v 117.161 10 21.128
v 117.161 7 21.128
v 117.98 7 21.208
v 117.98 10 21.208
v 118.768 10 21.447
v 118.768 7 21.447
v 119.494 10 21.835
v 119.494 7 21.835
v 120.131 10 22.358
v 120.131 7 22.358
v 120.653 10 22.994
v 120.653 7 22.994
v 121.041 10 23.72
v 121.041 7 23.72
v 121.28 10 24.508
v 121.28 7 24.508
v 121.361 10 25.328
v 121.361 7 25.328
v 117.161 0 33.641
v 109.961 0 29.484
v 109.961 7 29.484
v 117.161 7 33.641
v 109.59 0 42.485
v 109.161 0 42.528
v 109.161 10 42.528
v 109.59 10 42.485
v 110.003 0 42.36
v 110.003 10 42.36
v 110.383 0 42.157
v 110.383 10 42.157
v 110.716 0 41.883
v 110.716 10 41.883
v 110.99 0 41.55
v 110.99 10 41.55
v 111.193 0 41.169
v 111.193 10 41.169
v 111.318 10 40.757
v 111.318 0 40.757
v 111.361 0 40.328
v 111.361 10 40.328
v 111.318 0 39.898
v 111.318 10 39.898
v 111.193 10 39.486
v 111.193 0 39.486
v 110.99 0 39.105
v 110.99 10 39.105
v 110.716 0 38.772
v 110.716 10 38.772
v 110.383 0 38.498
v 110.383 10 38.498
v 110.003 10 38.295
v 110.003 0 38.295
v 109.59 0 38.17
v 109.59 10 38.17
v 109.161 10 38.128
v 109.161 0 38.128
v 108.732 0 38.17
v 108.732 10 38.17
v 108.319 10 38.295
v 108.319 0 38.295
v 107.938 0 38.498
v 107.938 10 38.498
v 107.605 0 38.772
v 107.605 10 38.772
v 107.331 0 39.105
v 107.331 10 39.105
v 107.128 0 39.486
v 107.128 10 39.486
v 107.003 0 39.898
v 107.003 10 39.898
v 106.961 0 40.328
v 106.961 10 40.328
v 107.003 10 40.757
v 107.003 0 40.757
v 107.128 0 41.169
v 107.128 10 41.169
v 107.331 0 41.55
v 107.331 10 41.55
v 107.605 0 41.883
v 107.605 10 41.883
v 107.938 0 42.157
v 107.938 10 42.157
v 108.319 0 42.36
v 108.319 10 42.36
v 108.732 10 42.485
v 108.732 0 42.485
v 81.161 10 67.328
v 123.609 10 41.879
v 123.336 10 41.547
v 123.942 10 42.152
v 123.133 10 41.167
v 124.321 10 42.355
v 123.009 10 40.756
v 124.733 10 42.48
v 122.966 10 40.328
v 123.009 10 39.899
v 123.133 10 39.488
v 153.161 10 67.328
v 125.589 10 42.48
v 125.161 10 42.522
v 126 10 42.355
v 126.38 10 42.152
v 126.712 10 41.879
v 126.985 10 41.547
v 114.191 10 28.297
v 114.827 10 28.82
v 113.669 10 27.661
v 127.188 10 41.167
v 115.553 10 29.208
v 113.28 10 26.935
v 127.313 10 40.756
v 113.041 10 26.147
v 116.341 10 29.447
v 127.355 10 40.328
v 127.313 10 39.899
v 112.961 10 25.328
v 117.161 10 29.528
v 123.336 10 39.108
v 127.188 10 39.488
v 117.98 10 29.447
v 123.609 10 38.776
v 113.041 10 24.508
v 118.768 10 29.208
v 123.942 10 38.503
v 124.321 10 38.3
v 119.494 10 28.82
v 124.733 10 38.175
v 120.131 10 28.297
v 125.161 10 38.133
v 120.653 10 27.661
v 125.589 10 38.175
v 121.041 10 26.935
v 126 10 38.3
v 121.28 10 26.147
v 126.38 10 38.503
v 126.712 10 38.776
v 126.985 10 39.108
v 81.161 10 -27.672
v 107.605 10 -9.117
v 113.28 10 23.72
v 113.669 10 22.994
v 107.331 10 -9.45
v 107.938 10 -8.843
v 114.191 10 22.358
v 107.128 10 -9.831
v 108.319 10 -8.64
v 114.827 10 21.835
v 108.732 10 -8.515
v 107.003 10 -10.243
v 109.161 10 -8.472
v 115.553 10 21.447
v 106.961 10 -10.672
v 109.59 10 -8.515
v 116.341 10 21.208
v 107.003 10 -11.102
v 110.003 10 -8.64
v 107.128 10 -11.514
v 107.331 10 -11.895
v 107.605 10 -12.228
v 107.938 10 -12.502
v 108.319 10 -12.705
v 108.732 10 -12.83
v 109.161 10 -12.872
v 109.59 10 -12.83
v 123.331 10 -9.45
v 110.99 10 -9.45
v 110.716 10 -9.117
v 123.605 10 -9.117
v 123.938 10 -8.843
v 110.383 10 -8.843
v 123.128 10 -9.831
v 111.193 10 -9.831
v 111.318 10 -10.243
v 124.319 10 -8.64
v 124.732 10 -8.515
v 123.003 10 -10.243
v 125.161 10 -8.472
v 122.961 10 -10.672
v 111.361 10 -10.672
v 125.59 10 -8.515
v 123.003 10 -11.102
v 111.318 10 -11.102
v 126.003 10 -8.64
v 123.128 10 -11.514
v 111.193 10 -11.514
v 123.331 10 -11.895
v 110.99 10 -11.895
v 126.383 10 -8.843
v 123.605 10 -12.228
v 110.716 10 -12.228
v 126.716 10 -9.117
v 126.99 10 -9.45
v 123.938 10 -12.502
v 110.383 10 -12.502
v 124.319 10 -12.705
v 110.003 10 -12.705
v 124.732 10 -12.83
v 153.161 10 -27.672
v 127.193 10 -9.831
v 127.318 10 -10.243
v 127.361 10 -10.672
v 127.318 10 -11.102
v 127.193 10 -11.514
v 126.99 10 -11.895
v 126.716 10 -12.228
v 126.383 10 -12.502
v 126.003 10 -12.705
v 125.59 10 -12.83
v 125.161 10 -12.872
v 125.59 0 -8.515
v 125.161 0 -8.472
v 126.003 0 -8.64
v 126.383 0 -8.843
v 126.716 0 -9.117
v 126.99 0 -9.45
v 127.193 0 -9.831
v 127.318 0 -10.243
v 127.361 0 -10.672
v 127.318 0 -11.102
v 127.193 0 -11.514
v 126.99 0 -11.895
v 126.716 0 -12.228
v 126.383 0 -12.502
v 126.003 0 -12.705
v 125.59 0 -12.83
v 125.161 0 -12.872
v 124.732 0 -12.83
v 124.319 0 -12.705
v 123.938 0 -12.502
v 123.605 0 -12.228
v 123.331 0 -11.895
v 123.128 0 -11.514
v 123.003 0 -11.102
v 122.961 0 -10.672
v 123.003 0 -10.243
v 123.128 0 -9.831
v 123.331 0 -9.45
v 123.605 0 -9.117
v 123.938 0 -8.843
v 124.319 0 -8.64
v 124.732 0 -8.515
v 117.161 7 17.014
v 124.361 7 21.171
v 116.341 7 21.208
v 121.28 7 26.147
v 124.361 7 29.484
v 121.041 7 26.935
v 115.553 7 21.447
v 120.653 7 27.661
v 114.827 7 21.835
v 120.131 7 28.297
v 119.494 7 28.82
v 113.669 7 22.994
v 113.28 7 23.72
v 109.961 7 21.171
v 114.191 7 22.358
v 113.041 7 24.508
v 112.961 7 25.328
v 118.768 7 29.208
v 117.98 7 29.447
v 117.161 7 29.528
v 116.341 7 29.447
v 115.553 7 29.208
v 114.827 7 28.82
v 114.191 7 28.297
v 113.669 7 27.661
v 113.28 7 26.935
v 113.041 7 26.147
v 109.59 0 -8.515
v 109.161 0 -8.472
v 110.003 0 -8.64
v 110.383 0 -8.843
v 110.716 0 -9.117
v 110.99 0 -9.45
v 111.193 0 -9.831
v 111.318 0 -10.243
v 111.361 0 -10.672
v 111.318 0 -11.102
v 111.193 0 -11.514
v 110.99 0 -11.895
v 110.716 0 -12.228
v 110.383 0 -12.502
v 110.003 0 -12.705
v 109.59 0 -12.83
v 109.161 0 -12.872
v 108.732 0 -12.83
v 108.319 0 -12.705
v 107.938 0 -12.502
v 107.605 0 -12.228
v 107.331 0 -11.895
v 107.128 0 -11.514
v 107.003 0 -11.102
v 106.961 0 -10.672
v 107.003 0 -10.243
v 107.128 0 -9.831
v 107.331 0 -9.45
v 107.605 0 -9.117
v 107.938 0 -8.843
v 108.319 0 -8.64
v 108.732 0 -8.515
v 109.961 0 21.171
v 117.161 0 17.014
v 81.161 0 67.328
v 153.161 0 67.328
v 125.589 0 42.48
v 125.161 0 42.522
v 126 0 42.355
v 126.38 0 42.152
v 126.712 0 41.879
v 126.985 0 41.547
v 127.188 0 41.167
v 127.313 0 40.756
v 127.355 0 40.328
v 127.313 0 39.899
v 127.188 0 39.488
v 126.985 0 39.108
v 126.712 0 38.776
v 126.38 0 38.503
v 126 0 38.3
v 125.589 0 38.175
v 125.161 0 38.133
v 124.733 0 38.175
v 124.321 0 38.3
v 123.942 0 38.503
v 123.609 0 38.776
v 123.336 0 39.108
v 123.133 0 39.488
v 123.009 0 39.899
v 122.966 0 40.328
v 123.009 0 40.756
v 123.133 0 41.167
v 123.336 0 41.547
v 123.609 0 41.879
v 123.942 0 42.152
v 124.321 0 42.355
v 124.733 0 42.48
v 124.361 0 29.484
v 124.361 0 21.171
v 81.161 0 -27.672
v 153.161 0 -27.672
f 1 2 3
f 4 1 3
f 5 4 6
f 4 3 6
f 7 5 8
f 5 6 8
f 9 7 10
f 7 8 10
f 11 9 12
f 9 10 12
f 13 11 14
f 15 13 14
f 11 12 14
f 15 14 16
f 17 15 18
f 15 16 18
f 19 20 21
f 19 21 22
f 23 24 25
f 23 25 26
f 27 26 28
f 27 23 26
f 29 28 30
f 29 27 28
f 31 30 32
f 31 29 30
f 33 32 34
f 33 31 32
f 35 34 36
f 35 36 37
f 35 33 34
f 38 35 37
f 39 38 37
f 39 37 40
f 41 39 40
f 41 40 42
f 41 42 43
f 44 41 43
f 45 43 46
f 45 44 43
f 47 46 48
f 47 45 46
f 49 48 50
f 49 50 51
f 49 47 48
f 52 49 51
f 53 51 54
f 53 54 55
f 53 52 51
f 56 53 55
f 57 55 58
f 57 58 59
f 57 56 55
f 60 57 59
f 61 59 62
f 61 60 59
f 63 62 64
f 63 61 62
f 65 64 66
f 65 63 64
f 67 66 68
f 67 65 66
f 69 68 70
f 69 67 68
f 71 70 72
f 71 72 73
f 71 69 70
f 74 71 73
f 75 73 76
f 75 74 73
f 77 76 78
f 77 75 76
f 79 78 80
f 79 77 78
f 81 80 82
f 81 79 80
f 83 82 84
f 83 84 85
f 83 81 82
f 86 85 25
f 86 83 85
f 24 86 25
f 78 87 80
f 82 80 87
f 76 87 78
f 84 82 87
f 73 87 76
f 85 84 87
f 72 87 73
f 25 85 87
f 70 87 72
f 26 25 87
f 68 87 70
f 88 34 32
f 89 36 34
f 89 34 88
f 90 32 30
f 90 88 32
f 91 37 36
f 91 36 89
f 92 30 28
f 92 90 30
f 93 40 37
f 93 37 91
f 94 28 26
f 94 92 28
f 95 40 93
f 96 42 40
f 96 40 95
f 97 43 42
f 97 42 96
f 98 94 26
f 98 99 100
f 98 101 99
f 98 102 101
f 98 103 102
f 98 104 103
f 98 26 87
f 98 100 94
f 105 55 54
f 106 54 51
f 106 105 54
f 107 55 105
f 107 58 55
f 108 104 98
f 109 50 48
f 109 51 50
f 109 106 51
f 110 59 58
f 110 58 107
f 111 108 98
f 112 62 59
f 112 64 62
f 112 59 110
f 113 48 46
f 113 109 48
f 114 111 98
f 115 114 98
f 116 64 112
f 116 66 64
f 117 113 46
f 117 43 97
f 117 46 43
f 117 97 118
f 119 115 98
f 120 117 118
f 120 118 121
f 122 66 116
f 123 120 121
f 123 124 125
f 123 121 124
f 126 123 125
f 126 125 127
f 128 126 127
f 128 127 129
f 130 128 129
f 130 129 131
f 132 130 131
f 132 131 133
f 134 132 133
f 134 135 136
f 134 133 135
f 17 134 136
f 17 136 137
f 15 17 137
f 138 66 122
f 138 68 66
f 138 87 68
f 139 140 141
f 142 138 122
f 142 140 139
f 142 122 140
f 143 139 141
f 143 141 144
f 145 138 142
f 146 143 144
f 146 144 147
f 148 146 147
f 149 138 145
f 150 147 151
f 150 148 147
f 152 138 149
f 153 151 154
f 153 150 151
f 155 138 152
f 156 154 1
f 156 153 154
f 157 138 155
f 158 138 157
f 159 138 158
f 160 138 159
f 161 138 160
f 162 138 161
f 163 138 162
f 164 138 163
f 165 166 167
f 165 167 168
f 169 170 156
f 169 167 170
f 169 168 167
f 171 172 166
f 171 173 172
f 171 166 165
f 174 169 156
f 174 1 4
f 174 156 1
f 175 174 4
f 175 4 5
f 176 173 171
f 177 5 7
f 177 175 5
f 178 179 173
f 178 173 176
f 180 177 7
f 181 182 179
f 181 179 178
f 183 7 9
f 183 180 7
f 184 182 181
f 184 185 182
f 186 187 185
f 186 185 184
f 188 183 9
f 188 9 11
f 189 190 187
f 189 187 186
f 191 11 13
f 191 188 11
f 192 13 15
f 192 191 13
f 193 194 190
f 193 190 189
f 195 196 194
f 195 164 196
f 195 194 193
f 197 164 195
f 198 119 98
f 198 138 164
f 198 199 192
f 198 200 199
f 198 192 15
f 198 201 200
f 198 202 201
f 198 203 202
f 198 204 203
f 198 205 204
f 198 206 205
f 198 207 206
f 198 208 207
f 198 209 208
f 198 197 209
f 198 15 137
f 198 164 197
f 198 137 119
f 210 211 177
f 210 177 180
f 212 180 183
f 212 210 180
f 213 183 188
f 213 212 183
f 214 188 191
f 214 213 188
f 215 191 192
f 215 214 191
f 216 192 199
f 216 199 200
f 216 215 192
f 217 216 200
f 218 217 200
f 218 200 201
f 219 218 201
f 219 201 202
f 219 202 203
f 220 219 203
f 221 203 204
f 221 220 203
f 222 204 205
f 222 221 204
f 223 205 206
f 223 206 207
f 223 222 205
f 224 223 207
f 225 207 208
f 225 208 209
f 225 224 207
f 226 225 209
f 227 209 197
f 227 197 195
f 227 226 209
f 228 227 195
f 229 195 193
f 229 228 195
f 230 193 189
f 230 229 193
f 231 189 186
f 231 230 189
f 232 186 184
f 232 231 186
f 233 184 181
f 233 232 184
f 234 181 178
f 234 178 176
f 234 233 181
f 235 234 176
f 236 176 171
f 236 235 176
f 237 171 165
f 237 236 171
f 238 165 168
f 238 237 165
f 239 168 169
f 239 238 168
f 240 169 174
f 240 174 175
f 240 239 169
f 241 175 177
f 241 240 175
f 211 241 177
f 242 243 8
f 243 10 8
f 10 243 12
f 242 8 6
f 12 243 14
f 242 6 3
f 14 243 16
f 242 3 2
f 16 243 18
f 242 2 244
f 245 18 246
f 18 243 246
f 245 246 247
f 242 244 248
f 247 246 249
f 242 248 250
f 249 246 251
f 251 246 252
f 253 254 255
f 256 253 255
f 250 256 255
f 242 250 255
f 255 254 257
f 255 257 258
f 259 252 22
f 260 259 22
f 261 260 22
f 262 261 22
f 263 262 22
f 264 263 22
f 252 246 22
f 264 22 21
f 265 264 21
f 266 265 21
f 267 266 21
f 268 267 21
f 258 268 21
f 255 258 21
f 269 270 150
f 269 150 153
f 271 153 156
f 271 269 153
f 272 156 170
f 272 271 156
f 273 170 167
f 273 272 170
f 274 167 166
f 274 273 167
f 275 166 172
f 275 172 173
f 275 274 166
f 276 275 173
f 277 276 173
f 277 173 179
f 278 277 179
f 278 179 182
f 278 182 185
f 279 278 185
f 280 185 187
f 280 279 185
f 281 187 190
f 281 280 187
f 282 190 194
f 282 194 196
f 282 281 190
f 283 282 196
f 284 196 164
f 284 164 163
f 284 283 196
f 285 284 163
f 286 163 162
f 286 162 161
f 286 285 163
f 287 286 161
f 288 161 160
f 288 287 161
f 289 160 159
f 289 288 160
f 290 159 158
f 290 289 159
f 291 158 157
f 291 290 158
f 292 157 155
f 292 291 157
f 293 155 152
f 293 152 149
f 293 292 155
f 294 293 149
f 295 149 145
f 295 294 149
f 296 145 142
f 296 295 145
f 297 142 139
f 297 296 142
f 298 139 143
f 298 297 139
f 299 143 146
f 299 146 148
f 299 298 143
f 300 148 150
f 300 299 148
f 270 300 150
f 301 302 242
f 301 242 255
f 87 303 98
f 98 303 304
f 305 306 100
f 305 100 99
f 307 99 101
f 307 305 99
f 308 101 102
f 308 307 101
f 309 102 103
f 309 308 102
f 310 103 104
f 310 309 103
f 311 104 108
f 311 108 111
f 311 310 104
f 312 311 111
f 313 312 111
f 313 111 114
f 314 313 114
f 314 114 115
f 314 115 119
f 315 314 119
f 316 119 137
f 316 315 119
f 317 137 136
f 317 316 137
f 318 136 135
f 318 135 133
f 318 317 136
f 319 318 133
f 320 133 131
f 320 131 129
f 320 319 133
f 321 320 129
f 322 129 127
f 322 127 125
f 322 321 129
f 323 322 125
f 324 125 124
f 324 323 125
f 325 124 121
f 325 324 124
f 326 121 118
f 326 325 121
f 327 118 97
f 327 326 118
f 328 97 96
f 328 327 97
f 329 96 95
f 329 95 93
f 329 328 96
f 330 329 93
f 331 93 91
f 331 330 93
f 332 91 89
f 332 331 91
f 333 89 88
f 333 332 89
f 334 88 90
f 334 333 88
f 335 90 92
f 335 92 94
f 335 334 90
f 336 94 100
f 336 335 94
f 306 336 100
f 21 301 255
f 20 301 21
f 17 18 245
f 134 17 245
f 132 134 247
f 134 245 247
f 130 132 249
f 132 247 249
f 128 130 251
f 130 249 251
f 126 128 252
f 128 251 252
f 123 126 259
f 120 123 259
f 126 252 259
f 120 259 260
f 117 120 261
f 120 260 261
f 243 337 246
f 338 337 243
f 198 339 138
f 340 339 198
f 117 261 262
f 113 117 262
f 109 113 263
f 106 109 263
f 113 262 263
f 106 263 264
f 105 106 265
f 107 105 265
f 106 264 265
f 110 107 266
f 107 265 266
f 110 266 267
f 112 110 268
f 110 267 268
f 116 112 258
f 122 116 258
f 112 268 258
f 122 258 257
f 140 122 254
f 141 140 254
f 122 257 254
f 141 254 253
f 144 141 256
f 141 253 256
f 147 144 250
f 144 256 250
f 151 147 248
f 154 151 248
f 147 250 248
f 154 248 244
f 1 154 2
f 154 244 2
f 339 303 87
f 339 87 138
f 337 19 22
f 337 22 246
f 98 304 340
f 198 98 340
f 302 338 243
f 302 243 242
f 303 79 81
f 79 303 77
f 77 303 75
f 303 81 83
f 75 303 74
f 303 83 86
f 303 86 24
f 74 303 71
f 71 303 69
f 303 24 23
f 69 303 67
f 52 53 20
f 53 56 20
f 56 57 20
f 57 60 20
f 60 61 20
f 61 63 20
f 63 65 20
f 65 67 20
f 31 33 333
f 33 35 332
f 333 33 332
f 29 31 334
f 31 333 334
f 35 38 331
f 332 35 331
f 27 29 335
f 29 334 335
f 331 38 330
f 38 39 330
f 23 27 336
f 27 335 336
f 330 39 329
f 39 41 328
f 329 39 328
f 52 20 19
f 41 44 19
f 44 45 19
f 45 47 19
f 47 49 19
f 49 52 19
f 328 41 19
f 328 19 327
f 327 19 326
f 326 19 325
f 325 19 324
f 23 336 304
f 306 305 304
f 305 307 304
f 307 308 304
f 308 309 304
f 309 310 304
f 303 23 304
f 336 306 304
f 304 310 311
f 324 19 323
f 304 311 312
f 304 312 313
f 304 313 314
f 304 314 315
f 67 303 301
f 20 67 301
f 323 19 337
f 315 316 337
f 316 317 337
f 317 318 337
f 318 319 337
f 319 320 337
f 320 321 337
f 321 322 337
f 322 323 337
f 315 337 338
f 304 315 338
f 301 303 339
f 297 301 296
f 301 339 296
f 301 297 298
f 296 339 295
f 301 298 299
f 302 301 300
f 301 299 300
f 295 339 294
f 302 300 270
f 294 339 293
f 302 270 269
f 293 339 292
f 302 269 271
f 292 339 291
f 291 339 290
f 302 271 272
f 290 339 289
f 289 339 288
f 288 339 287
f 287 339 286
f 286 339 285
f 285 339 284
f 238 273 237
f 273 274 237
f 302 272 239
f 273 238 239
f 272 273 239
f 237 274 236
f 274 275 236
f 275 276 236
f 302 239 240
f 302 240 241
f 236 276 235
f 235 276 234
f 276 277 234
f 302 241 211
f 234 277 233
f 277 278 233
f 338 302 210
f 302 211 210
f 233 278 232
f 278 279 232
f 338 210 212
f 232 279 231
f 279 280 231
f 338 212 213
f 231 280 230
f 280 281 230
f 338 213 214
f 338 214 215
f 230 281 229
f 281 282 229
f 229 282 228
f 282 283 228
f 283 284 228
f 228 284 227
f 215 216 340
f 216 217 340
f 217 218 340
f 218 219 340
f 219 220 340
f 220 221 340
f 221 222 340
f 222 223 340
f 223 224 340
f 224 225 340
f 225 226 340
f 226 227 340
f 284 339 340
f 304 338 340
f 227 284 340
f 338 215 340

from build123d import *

# Parameters (mm, degrees)
SKETCH1_W           = 72
SKETCH1_H           = 95
SKETCH1_R           = 2.2
SKETCH1_R_2         = 2.194279912
BOSS_EXTRUDE1_DEPTH = 10
CUT_EXTRUDE1_DEPTH  = 7
CUT_EXTRUDE2_DEPTH  = 7


with BuildPart() as part:
    # Sketch1 → Boss-Extrude1 (new body)
    with BuildSketch(Plane(origin=(0, 0, 0), x_dir=(1, 0, 0), z_dir=(0, 1, 0))):
        with Locations((117.160731424, -19.82755102)):
            Rectangle(SKETCH1_W, SKETCH1_H)
        with Locations(Location((125.160731424, 10.67244898, 0), (0, 0, 270))):
            Circle(SKETCH1_R, mode=Mode.SUBTRACT)
        with Locations(Location((109.160731424, 10.67244898, 0), (0, 0, 270))):
            Circle(SKETCH1_R, mode=Mode.SUBTRACT)
        with Locations(Location((125.160731424, -40.32755102, 0), (0, 0, 270))):
            Circle(SKETCH1_R_2, mode=Mode.SUBTRACT)
        with Locations(Location((109.160731424, -40.32755102, 0), (0, 0, 270))):
            Circle(SKETCH1_R, mode=Mode.SUBTRACT)
    extrude(amount=BOSS_EXTRUDE1_DEPTH)

    # Sketch2 → Cut-Extrude1 (cut)
    with BuildSketch(Plane.XZ):
        Polygon((109.960731424, 21.170629082), (109.960731424, 29.484472959), (117.160731424, 33.641394897), (124.360731424, 29.484472959), (124.360731424, 21.170629082), (117.160731424, 17.013707144), align=None)
    extrude(amount=-CUT_EXTRUDE1_DEPTH, mode=Mode.SUBTRACT)

    # Sketch5 → Cut-Extrude2 (cut)
    with BuildSketch(Plane.XZ.offset(-7)):
        with BuildLine():
            ThreePointArc((121.360731424, 25.32755102), (120.130579905, 28.297399501), (117.160731424, 29.52755102))
            Line((117.160731424, 29.52755102), (117.160731424, 21.12755102))
            ThreePointArc((117.160731424, 21.12755102), (120.130579905, 22.357702539), (121.360731424, 25.32755102))
        make_face()
        with BuildLine():
            Line((117.160731424, 21.12755102), (117.160731424, 29.52755102))
            ThreePointArc((117.160731424, 29.52755102), (112.960731424, 25.32755102), (117.160731424, 21.12755102))
        make_face()
    extrude(amount=-CUT_EXTRUDE2_DEPTH, mode=Mode.SUBTRACT)


solid = part.part
